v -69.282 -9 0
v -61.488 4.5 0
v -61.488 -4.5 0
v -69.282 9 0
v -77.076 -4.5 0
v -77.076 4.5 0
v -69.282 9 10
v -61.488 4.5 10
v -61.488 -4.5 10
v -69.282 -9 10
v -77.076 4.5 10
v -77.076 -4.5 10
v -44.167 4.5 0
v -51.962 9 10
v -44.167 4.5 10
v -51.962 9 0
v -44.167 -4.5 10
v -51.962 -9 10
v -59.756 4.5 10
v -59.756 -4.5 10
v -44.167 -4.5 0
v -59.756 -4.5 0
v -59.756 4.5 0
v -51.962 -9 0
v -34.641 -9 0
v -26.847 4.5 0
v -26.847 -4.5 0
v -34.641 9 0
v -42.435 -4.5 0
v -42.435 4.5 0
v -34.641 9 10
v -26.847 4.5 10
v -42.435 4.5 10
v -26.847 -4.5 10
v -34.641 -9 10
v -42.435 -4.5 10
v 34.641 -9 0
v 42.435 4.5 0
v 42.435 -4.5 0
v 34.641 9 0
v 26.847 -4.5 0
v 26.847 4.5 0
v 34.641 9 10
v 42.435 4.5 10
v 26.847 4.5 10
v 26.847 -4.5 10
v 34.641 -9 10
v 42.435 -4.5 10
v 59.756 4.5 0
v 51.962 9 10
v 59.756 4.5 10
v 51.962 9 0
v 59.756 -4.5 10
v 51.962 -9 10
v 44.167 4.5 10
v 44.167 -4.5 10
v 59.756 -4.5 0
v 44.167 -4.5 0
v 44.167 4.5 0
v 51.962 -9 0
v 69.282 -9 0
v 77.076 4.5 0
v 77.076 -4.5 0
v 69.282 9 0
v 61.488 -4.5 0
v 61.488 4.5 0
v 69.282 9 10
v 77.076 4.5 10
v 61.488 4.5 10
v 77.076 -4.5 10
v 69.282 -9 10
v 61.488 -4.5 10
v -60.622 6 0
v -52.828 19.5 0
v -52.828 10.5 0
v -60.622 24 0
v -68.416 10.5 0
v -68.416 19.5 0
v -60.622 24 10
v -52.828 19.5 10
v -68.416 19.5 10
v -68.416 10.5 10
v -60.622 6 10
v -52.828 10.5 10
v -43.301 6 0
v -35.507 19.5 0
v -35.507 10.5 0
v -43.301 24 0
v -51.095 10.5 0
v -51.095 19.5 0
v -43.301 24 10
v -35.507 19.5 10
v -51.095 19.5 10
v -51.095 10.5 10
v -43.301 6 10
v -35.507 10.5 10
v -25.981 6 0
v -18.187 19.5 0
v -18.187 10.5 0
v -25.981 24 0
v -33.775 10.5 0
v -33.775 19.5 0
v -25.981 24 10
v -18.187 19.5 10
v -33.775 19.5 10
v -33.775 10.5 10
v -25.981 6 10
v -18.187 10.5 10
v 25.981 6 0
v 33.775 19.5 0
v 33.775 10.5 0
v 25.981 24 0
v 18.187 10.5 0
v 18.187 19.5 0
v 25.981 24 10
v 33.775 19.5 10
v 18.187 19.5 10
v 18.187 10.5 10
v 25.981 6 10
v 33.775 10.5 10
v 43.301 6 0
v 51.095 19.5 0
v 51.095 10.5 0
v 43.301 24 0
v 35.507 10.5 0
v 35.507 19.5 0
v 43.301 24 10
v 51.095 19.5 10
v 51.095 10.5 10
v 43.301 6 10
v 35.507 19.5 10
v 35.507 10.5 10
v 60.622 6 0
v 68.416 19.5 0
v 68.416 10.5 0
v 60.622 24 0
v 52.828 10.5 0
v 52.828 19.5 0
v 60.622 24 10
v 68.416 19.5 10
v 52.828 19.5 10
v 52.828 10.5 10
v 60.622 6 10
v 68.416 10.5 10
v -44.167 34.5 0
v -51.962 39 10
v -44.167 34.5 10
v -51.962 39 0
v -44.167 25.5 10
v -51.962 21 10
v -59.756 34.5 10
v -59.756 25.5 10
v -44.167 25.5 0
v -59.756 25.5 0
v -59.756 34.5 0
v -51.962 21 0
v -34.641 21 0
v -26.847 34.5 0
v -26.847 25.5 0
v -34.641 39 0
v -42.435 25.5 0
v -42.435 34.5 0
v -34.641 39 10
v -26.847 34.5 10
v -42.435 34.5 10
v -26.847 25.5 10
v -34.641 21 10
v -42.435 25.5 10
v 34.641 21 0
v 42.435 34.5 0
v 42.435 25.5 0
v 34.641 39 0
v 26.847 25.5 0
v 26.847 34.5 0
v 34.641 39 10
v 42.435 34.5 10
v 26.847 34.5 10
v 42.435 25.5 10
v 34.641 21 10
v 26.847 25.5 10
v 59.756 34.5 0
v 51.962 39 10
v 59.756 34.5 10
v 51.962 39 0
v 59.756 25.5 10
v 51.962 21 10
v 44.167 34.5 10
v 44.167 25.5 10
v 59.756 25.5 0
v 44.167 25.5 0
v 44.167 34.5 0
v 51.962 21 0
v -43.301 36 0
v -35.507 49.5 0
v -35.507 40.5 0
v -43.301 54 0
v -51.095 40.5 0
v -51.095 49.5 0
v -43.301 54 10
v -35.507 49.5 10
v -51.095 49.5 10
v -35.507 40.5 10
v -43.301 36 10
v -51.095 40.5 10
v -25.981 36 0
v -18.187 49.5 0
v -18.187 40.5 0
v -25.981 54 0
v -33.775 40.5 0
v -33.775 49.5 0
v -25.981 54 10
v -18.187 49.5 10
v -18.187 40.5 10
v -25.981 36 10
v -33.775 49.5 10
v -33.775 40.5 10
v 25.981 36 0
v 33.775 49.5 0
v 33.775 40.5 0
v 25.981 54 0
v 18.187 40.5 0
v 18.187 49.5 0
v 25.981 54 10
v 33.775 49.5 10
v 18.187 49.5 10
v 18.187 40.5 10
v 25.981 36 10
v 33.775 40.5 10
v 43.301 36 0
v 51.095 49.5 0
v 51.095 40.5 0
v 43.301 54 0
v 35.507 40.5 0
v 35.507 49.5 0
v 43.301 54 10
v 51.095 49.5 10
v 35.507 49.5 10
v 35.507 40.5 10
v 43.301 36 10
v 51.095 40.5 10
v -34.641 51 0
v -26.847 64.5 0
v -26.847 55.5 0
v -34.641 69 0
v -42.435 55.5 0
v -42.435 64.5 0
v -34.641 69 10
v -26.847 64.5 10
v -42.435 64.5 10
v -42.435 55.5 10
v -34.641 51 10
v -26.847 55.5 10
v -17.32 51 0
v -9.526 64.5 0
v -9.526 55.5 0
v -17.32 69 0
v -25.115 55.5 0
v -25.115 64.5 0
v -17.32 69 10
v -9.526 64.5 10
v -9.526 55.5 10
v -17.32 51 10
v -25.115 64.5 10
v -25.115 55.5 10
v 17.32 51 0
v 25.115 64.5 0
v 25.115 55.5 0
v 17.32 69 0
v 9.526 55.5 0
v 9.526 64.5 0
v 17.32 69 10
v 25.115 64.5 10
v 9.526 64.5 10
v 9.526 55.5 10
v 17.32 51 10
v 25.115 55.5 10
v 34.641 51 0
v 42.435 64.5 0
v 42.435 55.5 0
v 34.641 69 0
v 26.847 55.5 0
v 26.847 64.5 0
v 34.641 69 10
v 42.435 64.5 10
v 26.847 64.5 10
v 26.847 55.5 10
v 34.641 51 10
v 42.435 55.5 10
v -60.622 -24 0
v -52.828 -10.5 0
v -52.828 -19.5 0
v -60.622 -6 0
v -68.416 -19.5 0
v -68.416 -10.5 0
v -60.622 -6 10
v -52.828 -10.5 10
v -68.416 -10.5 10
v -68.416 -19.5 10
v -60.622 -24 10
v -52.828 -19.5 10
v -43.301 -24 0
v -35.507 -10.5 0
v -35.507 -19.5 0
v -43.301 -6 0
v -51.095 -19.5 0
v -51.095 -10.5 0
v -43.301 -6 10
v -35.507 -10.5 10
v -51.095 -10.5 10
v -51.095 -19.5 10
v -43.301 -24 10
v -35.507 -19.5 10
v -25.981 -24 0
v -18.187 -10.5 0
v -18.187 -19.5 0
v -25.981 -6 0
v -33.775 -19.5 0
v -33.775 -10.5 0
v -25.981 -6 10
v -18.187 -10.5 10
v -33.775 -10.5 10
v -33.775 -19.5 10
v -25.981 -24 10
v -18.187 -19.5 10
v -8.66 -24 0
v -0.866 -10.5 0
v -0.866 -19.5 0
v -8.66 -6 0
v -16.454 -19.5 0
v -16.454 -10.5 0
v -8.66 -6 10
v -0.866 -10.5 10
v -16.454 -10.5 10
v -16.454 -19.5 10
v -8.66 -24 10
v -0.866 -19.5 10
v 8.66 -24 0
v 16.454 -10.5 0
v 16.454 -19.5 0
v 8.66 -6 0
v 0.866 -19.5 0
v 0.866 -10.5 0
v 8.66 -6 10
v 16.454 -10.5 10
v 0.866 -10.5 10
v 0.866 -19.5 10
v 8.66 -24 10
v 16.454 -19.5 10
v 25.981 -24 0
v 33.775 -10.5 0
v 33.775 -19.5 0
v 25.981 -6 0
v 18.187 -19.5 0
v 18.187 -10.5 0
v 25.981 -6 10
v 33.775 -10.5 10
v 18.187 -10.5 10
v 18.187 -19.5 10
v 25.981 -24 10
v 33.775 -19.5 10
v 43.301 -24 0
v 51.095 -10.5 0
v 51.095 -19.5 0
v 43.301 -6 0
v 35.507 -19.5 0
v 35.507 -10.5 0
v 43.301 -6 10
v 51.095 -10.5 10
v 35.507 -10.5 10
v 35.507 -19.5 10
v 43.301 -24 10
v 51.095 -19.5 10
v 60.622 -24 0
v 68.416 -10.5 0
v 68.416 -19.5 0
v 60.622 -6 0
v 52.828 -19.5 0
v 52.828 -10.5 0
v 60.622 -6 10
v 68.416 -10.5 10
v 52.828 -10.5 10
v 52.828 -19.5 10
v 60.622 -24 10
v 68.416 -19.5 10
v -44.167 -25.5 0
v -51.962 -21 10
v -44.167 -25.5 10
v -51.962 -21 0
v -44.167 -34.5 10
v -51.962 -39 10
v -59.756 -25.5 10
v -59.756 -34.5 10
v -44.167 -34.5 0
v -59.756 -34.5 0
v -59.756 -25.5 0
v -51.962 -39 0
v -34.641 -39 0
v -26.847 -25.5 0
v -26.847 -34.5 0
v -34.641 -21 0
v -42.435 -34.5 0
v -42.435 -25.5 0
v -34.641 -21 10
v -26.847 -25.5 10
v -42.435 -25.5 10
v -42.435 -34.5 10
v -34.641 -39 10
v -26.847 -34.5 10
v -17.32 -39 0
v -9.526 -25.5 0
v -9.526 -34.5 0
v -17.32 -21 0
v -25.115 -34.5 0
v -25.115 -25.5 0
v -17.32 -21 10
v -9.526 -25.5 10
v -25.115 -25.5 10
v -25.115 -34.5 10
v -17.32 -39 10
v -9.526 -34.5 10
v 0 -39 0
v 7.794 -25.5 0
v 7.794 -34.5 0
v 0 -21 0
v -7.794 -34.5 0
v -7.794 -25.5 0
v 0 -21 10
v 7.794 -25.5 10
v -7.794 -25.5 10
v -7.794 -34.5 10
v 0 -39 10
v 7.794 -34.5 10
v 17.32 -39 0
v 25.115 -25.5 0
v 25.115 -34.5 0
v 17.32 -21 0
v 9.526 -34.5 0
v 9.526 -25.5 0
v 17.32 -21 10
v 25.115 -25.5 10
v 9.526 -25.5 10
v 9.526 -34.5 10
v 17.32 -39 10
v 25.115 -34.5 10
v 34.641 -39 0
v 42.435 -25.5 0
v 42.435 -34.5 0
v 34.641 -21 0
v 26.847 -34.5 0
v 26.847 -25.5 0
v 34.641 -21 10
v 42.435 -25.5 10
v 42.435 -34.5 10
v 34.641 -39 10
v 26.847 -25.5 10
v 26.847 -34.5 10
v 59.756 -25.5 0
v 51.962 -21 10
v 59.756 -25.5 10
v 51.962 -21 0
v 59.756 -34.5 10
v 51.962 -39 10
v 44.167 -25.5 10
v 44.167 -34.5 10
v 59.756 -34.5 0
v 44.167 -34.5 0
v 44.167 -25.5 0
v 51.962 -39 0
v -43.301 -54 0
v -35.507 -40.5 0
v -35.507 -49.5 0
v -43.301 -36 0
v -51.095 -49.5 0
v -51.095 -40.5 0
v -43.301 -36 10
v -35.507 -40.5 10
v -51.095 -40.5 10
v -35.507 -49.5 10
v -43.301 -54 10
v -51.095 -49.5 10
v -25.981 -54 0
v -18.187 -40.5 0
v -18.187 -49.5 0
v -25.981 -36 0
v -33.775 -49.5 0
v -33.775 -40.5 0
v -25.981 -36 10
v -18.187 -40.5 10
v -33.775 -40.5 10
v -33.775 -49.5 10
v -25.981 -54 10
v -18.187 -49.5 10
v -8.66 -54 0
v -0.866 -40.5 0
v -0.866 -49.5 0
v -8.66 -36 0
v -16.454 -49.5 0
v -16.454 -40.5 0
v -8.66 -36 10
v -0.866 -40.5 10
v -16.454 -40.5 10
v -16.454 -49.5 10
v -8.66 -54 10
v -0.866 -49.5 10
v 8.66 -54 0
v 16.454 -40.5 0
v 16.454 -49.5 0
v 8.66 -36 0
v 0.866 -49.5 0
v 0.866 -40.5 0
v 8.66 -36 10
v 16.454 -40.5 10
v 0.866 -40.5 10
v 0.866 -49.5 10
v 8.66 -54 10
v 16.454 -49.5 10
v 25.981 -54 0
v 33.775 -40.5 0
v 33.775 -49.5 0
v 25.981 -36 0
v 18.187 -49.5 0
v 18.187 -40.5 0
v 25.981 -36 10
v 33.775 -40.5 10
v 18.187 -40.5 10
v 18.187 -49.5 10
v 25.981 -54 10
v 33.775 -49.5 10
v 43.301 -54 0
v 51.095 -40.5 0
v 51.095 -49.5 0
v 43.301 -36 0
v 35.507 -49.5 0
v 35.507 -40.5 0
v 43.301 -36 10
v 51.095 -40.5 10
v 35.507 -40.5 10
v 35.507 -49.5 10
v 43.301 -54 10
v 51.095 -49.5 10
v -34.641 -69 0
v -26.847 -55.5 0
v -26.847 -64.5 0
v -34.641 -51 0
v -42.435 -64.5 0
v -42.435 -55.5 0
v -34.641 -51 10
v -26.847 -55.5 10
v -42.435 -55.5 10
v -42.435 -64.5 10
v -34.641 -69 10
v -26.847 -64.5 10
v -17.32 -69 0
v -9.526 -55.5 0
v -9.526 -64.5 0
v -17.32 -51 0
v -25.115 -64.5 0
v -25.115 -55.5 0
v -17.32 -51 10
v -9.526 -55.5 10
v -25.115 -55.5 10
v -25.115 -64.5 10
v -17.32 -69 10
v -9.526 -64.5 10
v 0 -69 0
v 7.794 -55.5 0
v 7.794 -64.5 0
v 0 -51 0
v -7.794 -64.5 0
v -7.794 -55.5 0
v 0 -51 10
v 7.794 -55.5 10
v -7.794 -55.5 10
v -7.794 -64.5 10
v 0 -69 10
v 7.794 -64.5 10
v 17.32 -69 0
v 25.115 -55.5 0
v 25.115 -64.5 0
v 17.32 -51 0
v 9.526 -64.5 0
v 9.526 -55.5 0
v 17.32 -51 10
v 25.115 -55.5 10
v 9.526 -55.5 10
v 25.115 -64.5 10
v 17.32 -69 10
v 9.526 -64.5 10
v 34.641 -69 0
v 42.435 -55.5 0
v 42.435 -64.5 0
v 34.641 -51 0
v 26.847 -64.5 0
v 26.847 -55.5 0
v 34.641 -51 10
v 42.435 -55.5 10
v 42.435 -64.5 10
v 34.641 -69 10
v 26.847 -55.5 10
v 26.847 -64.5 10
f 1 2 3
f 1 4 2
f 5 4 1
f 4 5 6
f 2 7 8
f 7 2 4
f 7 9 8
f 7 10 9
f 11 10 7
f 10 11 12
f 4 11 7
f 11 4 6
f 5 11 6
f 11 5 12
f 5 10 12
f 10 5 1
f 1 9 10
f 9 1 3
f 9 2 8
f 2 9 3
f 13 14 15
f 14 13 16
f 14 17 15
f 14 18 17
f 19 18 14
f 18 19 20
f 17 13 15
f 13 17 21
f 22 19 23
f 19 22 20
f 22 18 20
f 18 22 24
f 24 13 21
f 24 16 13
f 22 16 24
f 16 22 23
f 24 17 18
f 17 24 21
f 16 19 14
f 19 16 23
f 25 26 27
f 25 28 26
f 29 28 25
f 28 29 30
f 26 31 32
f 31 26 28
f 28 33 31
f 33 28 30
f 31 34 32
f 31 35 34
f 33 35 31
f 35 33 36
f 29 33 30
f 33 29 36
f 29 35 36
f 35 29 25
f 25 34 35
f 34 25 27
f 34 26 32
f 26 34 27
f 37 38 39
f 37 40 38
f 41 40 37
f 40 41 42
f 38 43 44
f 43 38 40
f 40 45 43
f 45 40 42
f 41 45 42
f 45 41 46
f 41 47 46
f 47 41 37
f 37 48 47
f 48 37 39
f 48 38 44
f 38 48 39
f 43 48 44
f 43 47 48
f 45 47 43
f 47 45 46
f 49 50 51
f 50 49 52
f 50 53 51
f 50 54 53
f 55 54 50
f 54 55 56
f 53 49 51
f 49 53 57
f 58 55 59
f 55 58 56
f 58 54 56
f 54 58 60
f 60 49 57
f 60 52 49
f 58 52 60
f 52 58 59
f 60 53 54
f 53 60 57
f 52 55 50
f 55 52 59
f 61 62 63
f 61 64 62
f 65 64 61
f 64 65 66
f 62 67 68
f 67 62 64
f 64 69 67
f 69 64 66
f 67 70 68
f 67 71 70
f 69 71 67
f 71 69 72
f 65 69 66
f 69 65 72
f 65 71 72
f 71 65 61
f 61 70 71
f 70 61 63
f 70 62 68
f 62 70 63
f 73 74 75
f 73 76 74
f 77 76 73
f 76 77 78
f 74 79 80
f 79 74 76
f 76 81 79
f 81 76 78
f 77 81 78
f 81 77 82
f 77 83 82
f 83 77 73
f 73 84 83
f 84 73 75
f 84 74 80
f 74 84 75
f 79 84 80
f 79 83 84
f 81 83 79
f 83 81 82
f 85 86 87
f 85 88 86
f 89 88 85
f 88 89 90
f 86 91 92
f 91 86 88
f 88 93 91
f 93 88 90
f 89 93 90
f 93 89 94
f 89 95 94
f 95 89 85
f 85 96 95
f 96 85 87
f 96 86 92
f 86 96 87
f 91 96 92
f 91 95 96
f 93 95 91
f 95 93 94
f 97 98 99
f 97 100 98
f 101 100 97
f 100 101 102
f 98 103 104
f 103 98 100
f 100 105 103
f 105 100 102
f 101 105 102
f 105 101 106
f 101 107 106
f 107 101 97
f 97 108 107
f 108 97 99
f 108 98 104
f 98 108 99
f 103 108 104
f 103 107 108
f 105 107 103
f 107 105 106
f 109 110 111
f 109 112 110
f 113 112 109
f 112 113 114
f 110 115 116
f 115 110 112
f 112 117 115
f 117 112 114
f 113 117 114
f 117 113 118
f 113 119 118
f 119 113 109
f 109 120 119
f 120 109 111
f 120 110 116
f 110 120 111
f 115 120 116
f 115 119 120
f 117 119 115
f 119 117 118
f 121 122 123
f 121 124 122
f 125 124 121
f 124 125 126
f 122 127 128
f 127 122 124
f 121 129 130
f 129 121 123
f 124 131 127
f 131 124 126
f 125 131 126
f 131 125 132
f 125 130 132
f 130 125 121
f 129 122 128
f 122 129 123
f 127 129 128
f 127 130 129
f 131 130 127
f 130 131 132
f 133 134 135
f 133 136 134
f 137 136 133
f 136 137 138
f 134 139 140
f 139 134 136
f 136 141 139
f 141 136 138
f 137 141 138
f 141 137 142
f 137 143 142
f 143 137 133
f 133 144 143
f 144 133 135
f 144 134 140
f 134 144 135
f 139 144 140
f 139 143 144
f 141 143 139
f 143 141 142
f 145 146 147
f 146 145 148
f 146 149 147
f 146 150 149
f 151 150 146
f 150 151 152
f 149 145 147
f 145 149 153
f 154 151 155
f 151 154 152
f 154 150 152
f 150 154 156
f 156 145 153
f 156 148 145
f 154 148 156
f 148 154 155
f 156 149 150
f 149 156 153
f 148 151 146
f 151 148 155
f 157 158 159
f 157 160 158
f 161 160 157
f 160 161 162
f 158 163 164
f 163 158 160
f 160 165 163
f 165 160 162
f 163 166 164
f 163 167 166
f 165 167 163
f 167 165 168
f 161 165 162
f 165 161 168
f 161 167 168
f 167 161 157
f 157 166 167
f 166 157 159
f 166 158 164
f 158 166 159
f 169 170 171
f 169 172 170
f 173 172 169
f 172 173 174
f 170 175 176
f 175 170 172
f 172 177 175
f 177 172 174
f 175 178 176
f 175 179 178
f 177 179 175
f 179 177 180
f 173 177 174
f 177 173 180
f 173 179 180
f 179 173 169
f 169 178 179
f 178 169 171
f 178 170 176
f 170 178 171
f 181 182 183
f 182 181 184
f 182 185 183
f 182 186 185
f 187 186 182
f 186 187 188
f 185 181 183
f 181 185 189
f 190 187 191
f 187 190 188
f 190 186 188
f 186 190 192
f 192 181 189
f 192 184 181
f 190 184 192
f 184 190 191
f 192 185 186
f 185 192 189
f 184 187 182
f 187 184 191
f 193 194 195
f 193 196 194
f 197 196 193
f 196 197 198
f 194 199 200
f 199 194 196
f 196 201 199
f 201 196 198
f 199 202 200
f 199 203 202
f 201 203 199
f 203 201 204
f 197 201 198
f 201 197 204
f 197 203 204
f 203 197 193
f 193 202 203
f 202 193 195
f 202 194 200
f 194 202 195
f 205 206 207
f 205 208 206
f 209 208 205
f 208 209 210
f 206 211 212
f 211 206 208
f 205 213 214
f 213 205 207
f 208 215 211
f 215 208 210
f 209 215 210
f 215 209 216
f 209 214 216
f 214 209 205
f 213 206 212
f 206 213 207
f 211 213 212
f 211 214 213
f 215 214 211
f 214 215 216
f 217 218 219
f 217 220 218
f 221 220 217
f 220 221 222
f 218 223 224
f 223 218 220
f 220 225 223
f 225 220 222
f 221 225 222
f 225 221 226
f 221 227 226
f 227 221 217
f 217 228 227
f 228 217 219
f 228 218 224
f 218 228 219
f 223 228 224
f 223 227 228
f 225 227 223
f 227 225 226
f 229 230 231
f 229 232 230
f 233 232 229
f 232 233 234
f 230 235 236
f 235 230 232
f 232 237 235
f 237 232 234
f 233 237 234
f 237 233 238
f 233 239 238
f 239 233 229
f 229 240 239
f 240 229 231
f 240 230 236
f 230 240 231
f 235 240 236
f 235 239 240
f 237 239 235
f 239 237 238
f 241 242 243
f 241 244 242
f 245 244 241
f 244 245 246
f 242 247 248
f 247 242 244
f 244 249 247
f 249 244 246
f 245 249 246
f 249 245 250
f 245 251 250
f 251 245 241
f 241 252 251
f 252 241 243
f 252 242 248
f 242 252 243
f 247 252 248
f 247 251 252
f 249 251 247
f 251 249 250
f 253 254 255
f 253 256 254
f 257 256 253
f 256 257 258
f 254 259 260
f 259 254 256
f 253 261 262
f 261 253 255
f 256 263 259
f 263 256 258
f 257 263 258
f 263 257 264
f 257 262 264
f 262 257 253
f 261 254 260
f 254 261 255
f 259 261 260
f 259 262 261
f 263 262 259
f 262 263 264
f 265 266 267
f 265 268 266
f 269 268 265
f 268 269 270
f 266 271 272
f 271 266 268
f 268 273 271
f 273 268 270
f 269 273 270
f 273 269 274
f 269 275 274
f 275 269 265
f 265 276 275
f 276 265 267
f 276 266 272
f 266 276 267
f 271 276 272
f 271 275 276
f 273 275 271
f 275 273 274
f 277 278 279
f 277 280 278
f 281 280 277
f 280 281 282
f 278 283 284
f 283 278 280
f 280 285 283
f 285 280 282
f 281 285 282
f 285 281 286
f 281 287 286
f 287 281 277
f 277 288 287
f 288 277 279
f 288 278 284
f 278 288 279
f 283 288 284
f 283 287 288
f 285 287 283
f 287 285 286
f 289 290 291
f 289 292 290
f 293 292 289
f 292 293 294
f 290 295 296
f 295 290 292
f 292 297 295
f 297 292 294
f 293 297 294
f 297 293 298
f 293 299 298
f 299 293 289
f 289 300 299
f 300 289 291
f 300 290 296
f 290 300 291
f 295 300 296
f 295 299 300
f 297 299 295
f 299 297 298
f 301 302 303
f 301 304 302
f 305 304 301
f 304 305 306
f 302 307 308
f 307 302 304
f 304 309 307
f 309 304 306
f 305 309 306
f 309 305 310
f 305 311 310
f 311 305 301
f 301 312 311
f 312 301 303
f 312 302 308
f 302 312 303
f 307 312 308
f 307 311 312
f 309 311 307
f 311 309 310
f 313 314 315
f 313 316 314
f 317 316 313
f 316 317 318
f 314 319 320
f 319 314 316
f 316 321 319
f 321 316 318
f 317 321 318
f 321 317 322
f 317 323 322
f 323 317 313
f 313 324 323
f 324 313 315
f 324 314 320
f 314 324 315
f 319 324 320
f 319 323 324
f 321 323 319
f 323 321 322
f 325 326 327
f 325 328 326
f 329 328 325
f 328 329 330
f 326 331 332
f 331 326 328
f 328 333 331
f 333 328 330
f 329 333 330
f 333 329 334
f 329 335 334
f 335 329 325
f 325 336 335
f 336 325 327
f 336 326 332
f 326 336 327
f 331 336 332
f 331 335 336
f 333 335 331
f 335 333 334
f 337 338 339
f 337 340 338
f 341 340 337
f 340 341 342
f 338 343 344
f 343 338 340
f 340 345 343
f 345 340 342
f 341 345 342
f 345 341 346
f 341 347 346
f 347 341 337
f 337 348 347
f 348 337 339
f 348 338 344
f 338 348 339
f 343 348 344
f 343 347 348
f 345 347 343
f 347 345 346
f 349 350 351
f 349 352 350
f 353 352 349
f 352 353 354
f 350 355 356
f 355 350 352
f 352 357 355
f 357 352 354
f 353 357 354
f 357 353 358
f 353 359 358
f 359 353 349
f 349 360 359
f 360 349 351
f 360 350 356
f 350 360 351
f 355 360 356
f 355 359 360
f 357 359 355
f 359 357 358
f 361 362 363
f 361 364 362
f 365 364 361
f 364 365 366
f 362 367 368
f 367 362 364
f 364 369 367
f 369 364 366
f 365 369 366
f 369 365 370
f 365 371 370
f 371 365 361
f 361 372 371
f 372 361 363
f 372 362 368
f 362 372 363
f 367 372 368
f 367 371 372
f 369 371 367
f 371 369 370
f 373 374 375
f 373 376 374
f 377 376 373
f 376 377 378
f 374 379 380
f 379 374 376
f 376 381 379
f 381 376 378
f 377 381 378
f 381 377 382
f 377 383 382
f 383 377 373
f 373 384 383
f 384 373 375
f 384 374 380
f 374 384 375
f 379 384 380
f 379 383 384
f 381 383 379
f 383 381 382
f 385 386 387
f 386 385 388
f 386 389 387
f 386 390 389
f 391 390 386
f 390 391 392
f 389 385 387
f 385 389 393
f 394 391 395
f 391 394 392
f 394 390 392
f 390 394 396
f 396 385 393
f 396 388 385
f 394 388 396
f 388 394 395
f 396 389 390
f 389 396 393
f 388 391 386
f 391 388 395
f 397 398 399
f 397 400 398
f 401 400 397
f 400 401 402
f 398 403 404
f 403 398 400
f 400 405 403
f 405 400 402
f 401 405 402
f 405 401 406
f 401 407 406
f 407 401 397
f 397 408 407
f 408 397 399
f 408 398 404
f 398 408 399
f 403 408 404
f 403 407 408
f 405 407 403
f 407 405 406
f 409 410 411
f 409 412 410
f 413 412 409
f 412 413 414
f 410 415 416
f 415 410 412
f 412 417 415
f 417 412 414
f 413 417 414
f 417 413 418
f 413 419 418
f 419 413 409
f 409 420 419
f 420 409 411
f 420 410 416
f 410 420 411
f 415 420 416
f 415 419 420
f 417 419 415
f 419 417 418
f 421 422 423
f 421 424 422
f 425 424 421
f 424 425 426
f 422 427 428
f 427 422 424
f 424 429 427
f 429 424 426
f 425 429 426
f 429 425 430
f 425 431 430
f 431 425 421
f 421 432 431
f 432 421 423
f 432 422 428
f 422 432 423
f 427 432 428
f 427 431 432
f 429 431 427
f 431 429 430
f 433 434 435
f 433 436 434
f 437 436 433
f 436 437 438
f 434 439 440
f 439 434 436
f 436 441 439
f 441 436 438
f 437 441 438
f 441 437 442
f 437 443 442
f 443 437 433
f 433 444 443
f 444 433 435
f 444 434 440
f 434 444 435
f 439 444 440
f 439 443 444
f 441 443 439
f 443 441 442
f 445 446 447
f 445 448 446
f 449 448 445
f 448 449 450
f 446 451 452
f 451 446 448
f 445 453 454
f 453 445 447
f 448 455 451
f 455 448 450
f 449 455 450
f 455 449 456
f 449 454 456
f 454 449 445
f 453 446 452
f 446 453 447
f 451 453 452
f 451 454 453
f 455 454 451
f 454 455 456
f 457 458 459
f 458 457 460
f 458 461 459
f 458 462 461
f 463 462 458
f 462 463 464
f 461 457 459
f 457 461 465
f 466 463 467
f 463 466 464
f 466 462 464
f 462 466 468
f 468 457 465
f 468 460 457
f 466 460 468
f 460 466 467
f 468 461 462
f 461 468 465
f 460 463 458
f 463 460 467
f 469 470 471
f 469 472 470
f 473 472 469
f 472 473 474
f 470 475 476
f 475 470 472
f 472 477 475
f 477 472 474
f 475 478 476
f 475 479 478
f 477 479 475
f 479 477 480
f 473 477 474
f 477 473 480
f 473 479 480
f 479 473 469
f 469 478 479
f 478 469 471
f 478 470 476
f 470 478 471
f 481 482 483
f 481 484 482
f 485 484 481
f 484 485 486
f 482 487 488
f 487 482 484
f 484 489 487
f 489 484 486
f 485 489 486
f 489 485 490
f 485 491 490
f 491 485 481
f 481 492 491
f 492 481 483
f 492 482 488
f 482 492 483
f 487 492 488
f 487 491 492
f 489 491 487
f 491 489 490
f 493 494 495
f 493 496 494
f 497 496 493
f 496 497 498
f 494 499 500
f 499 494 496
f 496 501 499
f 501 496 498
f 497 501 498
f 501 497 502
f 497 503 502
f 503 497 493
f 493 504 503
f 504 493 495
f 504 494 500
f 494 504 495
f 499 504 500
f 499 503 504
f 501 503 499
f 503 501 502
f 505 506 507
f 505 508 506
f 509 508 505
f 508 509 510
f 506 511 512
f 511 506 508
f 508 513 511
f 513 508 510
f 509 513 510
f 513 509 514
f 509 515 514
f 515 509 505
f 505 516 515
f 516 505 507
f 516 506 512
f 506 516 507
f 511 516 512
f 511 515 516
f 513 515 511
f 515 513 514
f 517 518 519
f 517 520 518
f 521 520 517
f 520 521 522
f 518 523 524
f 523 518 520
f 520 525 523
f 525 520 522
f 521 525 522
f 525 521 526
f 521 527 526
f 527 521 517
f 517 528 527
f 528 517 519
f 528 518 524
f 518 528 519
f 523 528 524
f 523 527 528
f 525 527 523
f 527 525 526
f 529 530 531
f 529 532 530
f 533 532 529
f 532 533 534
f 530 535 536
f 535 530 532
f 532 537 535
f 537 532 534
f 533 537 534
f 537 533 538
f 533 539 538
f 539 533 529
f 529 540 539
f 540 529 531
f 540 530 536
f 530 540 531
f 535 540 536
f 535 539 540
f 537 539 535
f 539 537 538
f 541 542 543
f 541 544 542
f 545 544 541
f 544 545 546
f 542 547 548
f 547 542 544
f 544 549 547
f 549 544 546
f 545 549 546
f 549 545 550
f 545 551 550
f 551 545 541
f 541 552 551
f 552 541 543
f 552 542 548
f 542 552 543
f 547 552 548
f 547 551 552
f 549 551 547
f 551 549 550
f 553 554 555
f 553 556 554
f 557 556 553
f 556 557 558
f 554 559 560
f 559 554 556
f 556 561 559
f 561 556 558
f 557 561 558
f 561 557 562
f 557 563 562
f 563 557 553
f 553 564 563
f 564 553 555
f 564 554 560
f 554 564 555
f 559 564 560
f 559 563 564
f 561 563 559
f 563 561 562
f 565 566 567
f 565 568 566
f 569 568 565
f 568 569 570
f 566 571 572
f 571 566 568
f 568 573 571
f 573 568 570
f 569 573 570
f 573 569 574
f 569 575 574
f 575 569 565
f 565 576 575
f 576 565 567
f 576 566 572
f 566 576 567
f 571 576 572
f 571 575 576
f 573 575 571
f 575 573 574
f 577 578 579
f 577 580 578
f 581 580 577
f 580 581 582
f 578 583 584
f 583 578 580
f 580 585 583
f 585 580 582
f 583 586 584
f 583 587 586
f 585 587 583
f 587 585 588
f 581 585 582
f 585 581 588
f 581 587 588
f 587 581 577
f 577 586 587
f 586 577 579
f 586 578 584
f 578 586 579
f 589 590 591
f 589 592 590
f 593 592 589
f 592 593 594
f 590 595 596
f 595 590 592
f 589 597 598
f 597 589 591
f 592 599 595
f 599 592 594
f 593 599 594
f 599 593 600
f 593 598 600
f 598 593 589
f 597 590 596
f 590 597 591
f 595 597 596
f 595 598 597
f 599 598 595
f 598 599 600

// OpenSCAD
// file: ../../src/semi_regular/tess_4_8_8.scad
/*
    Tessella: Semi-Regular Tessellation - 4.8.8
    ===========================================
    This module implements the tessellation of a plane using a semi-regular tiling
    pattern defined by the vertex configuration 4.8.8, where one square and two
    octagons meet at each vertex.
*/

include <../tessUtils.scad>;

/**
 * @brief Generates center points for an octagonal grid.
 *
 * Creates a 2D grid of center points for octagons spaced by the octagon's side length.
 *
 * @param radius The radius of each octagon.
 * @param n The number of octagons along the x-axis.
 * @param m The number of octagons along the y-axis.
 * @param rotate (Optional) Boolean to apply rotation to the grid, default is true.
 * @return An array of center points for octagons.
 */
function octagons_centers_rect(
    radius,
    n,
    m
) =
    let (
        side_length = (radius * 2) / (sqrt(4 + 2 * sqrt(2))), // Side length of the octagon
        total_width = side_length * (1 + sqrt(2)) // Total width including spacing
    ) squares_centers_rect(total_width, n, m);

/**
 * @brief Generates center points for the squares in a 4.8.8 tiling grid.
 *
 * Aligns the square centers with the octagonal centers by using a shifted grid,
 * creating the required semi-regular tiling pattern.
 *
 * @param radius The radius of the octagons.
 * @param n The number of octagons along the x-axis.
 * @param m The number of octagons along the y-axis.
 * @return An array of center points for squares.
 */
function squares_8_8_centers_rect(radius, n, m) =
    let (
        side_length = (radius * 2) / (sqrt(4 + 2 * sqrt(2))), // Side length of the octagon
        total_width = side_length * (1 + sqrt(2)), // Total width including spacing
        shift_x = total_width / 2, // Horizontal shift for squares
        shift_y = total_width / 2 // Vertical shift for squares
    ) [for (c = squares_centers_rect(total_width, n - 1, m - 1)) [c[0] + shift_x, c[1] + shift_y]];

/**
 * @brief Generates vertices for octagons based on radius and center points.
 *
 * Generates the vertices for octagons based on the provided center points and radius.
 *
 * @param radius The radius of each octagon.
 * @param centers Array of center points.
 * @param angular_offset (Optional) Rotation angle for vertices, default is 22.5°.
 * @return Array of vertices for each octagon.
 */
function octagons_vertices(radius, centers, angular_offset = 22.5) =
    [
        for (center = centers) [
            for (i = [0:7]) let (
                angle = i * 45 + angular_offset
            ) [center[0] + radius * cos(angle), center[1] + radius * sin(angle)],
        ],
    ];
// file: ../../src/regular/triangles.scad
/*
    Tessella: Regular Tessellation - Triangles
    ==========================================
    This module implements the tessellation of a plane using regular triangles,
    where each tile is congruent, and all vertex angles around a point sum to 360°.

    Polygon properties:
    - Sides: 3
    - Interior Angle: 60°
    - Vertex Configuration: 3.3.3.3.3.3

    Mathematically valid because the interior angle divides 360° exactly.
    Reference: Euclidean tessellation theory for regular polygons.
*/

include <../tessUtils.scad>;

/**
 * @brief Generates center points for a "levels-based" triangle arrangement.
 *
 * Creates a roughly radial or diamond-like pattern of triangle centers. The center row
 * has (2*levels - 1) triangles, each additional row above/below decreases by 1 triangle.
 *
 * @param side   The side length of each equilateral triangle.
 * @param levels Number of levels away from the center row.
 * @return       An array of center points for triangles.
 */
function triangles_centers_radial(side, levels) =
    let (
        // Vertical height of each triangle
        vheight = side * sqrt(3) / 2,
        // Generate rows symmetrically around the center
        rows0 = [
            for (i = [-ceil(levels / 2 - 1):ceil(levels / 2 - 1)])
            let (
                rowCount = (levels - ( (levels + 1) % 2)) - abs(i), // Number of triangles in the row
                yOff = i * vheight, // Vertical offset for the row
                xStart = -(rowCount - 1) * side / 2 // Horizontal start to center the row
            ) [[xStart, yOff], rowCount],
        ],
        rows1 = (levels == 1) ? []
        : [
            for (i = [-(floor(levels / 2)):(floor(levels / 2 - 1))])
            let (
                rowCount = (levels - ( (levels) % 2)) - abs(i), // Number of triangles in the row
                yOff = i * vheight + vheight / 2 - (vheight - sqrt(3) / 3 * side) / 2, // Vertical offset for the row
                xStart = -(rowCount - 1) * side / 2 // Horizontal start to center the row
            ) [[xStart, yOff], rowCount],
        ],
        rows = concat(rows0, rows1)
    )
    // Generate center points for all rows
    [for (row = rows) for (j = [0:row[1] - 1]) [row[0][0] + j * side, row[0][1]]];

/**
 * @brief Generates center points for a rectangular grid of equilateral triangles (n x m).
 *
 * Alternating rows are horizontally offset by half a side for a typical triangular tiling pattern.
 *
 * @param side The side length of each triangle.
 * @param n    Number of triangles along x-axis.
 * @param m    Number of rows (y-axis).
 * @return     An array of center points for triangles.
 */
function triangles_centers_rect(side, n, m) =
    let (
        vheight = side * sqrt(3) / 2, // Vertical height of each triangle
        col_shift = side / 2, // Horizontal shift for each column
        row_shift = vheight, // Horizontal shift for alternating rows
        offset_shift = row_shift - (vheight - sqrt(3) / 3 * side) * 2
    ) [for (j = [0:m - 1], i = [0:n - 1]) [(i) * row_shift + (offset_shift * (j % 2)), j * col_shift]];

/**
 * @brief Generates vertices for equilateral triangles at specified centers.
 *
 * Rotates every other row by 180° and applies an additional angular offset for customization.
 *
 * @param side           The side length of each triangle.
 * @param centers        The array of center points for the triangles.
 * @param angular_offset An additional angular offset to apply to all triangles.
 * @param is_radial      If true, calculates the row index based on radial arrangement.
 * @return               A nested array of vertices for all triangles.
 */
function triangle_vertices(side, centers, angular_offset = 0, rect = true) =
    let (
        EPSILON = 1e-9, // Small value for floating-point comparison
        vheight = side * sqrt(3) / 2, // Vertical height of each triangle
        // This messy line pretty much determines if a row is odd or even based on the vertical position, it needs to check
        // using the reverse calculation of rows1 / offset shift, looking at that now it should probably be refactored.
        // Overall, this works and gets the geometrical idea across, but it's not the most readable (literally horrendous).
        row_parity = [
            for (c = centers) (
                (
                    ( ( ( (rect ? c[0] : c[1]) + EPSILON - vheight / 2 + (vheight - sqrt(3) / 3 * side) / 2) / vheight) % 1) <= EPSILON
                ) && (
                    (
                        ( ( (rect ? c[0] : c[1]) - EPSILON - vheight / 2 + (vheight - sqrt(3) / 3 * side) / 2) / vheight) % 1
                    ) >= -EPSILON
                ) ? 0
                : 1
            ),
        ], // Calculate row parity
        rotation_adjustment = [
            for (i = [0:len(centers) - 1]) (
                row_parity[i] ? (rect ? 0 : 180)
                : (rect ? 180 : 0)
            ),
        ] // Flip every other row
    ) [
            for (i = [0:len(centers) - 1]) [
                for (j = [0:2]) let (
                    angle = j * 120 + angular_offset + rotation_adjustment[i]
                ) [
                        centers[i][0] + side / sqrt(3) * cos(angle),
                        centers[i][1] + side / sqrt(3) * sin(angle),
                ],
            ],
    ];
// file: ../../src/regular/squares.scad
/*
    Tessella: Regular Tessellation - Squares
    ========================================
    This module implements the tessellation of a plane using regular squares,
    where each tile is congruent, and all vertex angles around a point sum to 360°.

    Polygon properties:
    - Sides: 4
    - Interior Angle: 90°
    - Vertex Configuration: 4.4.4.4
*/

include <../tessUtils.scad>;

/**
 * @brief Generates center points for a "levels-based" square arrangement.
 *
 * Creates a diamond-like pattern of square centers. The center (middle) row has (2*levels - 1) squares.
 * Each additional row above or below the center has one fewer square, until only 1 square remains at the
 * top and bottom (when levels > 1).
 *
 * @param side   The side length of each square.
 * @param levels Number of levels (rows above the center, plus the center, plus rows below).
 * @return       An array of center points for squares.
 */
function squares_centers_radial(side, levels) =
    let (
        // Offsets for spacing
        offset_x = side, // Horizontal spacing
        offset_y = side, // Vertical spacing

        // Generate rows from the center outward
        // Row i = -(levels-1) to +(levels-1), where i=0 is the center row.
        rows = [
            for (i = [-(levels - 1):(levels - 1)])
            let (
                rowCount = (2 * levels - 1) - abs(i), // Number of squares in the row
                yOff = i * offset_y, // Vertical position of the row
                xStart = -(rowCount - 1) * offset_x / 2 // Horizontal start to center the row
            ) [[xStart, yOff], rowCount],
        ]
    )
    // For each row definition, generate square center points
    [for (row = rows) for (j = [0:row[1] - 1]) [row[0][0] + j * offset_x, row[0][1]]];

/**
 * @brief Generates center points for a rectangular grid of squares (n x m).
 *
 * Produces a 2D grid of center points spaced by side length in both x and y directions.
 *
 * @param side The side length of each square.
 * @param n    The number of squares along the x-axis.
 * @param m    The number of squares along the y-axis.
 * @return     An array of center points for squares.
 */
function squares_centers_rect(side, n, m) =
    let (offset_x = side, offset_y = side) [for (ix = [0:n - 1], iy = [0:m - 1]) [ix * offset_x, iy * offset_y]];

/**
 * @brief Renders 2D squares at specified centers, with optional color gradient.
 *
 * @param side          The side length of each square.
 * @param spacing       (Optional) Spacing between squares, default is 0.
 * @param centers       (Optional) Array of center points. If empty, `levels` or (n,m) must be provided.
 * @param levels        (Optional) Number of levels for diamond-like pattern generation.
 * @param n, m          (Optional) Grid dimensions if using NxM generation.
 * @param color_scheme  (Optional) Name of the color scheme for gradient.
 * @param alpha         (Optional) Alpha transparency value.
 */

function squares_vertices(side, centers, angular_offset = 45) =
    [
        for (
            center = centers
        ) [
            for (i = [0:3]) let (angle = i * 90 + angular_offset) [
                    center[0] + side / sqrt(2) * cos(angle),
                    center[1] + side / sqrt(2) * sin(angle),
            ],
        ],
    ];
// file: ../../src/regular/hexagons.scad
/*
    Tessella: Regular Tessellation - Hexagons
    =========================================
    Tessellates a plane using regular hexagons.
    Properties:
    - Sides: 6
    - Interior Angle: 120°
    - Vertex Configuration: 6.6.6
*/

include <../tessUtils.scad>;

/**
 * Generates center points for a hexagonal tessellation in a radial pattern.
 * @param radius The radius of each hexagon.
 * @param levels Number of radial levels.
 * @return Array of hexagon center points.
 */
function hexagons_centers_radial(radius, levels) =
    let (
        offset_x = radius * cos(30),
        offset_y = radius + radius * sin(30),
        offset_step = 2 * offset_x,
        dx = -(levels - 1) * offset_x * 2,
        beginning_n = 2 * levels - 1,
        hexagons_pts = function(hex_datum)
        let (
            tx = hex_datum[0][0] + dx,
            ty = hex_datum[0][1],
            n_pts = hex_datum[1],
            offset_xs = [for (i = [0:n_pts - 1]) i * offset_step]
        ) [for (x = offset_xs) [x + tx, ty]],
        upper_hex_data = levels > 1 ? [
                for (i = [1:beginning_n - levels]) let (
                    x = offset_x * i,
                    y = offset_y * i,
                    n_upper = beginning_n - i
                ) [[x, y], n_upper],
            ]
        : [],
        lower_hex_data = levels > 1 ? [for (hex_datum = upper_hex_data) [[hex_datum[0][0], -hex_datum[0][1]], hex_datum[1]]]
        : [],
        total_hex_data = [[[0, 0], beginning_n], each upper_hex_data, each lower_hex_data],
        centers = [for (hex_datum = total_hex_data) hexagons_pts(hex_datum)]
    ) concat([for (c = centers) each c]);

/**
 * Generates center points for a rectangular hexagonal grid.
 * @param radius The radius of each hexagon.
 * @param n Number of hexagons along x-axis.
 * @param m Number of hexagons along y-axis.
 * @return Array of hexagon center points.
 */
function hexagons_centers_rect(radius, n, m) =
    let (
        offset_x = radius * cos(30),
        offset_y = radius + radius * sin(30),
        offset_step = 2 * offset_x
    ) [for (i = [0:n - 1], j = [0:m - 1]) [i * offset_step + (j % 2) * (offset_step / 2), j * offset_y]];

/**
 * Generates vertices for hexagons based on radius and center points.
 * @param radius The radius of each hexagon.
 * @param centers Array of center points.
 * @param angular_offset Rotation angle for vertices.
 * @return Array of vertices for each hexagon.
 */
function hexagons_vertices(radius, centers, angular_offset = 30) =
    [
        for (center = centers) [
            for (i = [0:5]) let (
                angle = i * 60 + angular_offset
            ) [center[0] + radius * cos(angle), center[1] + radius * sin(angle)],
        ],
    ];
// file: ../../src/tessUtils.scad
EPSILON = 1e-3; ///< Tolerance value used for floating-point comparisons.

/**
 * @brief Generates a gradient color based on normalized coordinates and a color scheme.
 *
 * Selects a color by mapping normalized x and y coordinates to RGB values according to the specified color scheme.
 *
 * @param normalized_x The normalized x-coordinate (0 to 1).
 * @param normalized_y The normalized y-coordinate (0 to 1).
 * @param color_scheme The name of the color scheme to use.
 * @return An RGB color array [r, g, b].
 */
function get_gradient_color(normalized_x, normalized_y, color_scheme) =
    color_scheme == "scheme1" ? [normalized_x, 1 - normalized_x, normalized_y]
    : // Red to Blue
    color_scheme == "scheme2" ? [1 - normalized_y, normalized_x, normalized_y]
    : // Green to Magenta
    color_scheme == "scheme3" ? [normalized_y, 1 - normalized_y, normalized_x]
    : // Blue to Yellow
    color_scheme == "scheme4" ? [1 - normalized_x, normalized_x, 1 - normalized_y]
    : // Cyan to Red
    color_scheme == "scheme5" ? [normalized_x, normalized_x * normalized_y, 1 - normalized_x]
    : // Purple to Green
    color_scheme == "scheme6" ? [1 - normalized_x * normalized_y, normalized_y, normalized_x]
    : // Orange to Blue
    [0.9, 0.9, 0.9]; // Default color (grey) if no valid color scheme is provided

/**
 * @brief Renders points as text labels and optional spheres in the 3D space.
 *
 * Displays each point's coordinates as text at its location and optionally places a sphere at the point.
 *
 * @param points An array of points to display, each as [x, y].
 * @param text_size (Optional) Size of the text labels; default is 1.
 * @param color (Optional) Color of the text labels; default is [0.1, 0.1, 0.1].
 * @param pointD (Optional) Diameter of the sphere to place at each point; if undef, no sphere is placed.
 * @param point_color (Optional) Color of the spheres; default is [0.1, 0.1, 0.1].
 * @param fn (Optional) Number of facets for the spheres; default is 8.
 */
module print_points(
    points,
    text_size = 1,
    color = [0.1, 0.1, 0.1],
    pointD = undef,
    point_color = [0.1, 0.1, 0.1],
    fn = 8
) {
    for (point = points) {
        // Translate +1 in Z-axis to avoid z-fighting with the surface
        translate([point[0], point[1] + pointD * 2, pointD * 2]) color(color)
                text(str("[", point[0], ", ", point[1], "]"), size=text_size, valign="center", halign="center");
        if (pointD != undef) {
            // Place a sphere at the point if pointD is specified
            color(point_color) translate([point[0], point[1], 0]) sphere(pointD, $fn=fn);
        }
    }
}

/**
 * @brief Checks if two points are equal within a specified tolerance.
 *
 * @param p1 First point as [x, y].
 * @param p2 Second point as [x, y].
 * @param tolerance (Optional) Tolerance value for comparison; default is EPSILON.
 * @return True if points are equal within tolerance, false otherwise.
 */
function points_equal(p1, p2, tolerance = EPSILON) =
    let (
        comparisons = [
            for (i = [0:len(p1) - 1]) abs(p1[i] - p2[i]) < tolerance,
        ]
    )
    // Check if all comparisons are true
    len([for (comp = comparisons) if (comp) true]) == len(comparisons);

/**
 * @brief Checks if a point exists within a list of points, within a specified tolerance.
 *
 * @param point The point to check, as [x, y].
 * @param list The list of points to search within.
 * @param tolerance (Optional) Tolerance value for comparison; default is EPSILON.
 * @return True if the point exists in the list within tolerance, false otherwise.
 */
function is_point_in_list(
    point,
    list,
    tolerance = EPSILON
) =
    let (equal_points = [for (p = list) points_equal(p, point, tolerance)]) len([for (eq = equal_points) if (eq) true]) > 0;

/**
 * @brief Filters out centers that are present in a filter list.
 *
 * Removes centers from the provided list that match any in the filter_list, within a specified tolerance.
 *
 * @param centers An array of centers to be filtered.
 * @param filter_list An array of centers to filter out.
 * @param tolerance (Optional) Tolerance value for comparison; default is EPSILON.
 * @return A filtered array of centers.
 */
function filter_center_points(centers, filter_list, tolerance = EPSILON) =
    [for (center = centers) if (!is_point_in_list(center, filter_list, tolerance)) center];

/** 
 * @brief Renders a generic polygon shape with optional extrusion and color gradient.
 *
 * This module allows rendering of polygons defined by vertices and paths, with optional extrusion for 3D effects.
 * It supports color gradients based on center points and a specified color scheme.
 *
 * @param vertices An array of vertices for the polygon.    
 * @param paths An array of paths defining the polygon.
 * @param centers (Optional) An array of center points for each polygon, used for color gradient.
 * @param color_scheme (Optional) A string defining the color scheme for the gradient.
 * @param alpha (Optional) Transparency level for the color; default is 1 (opaque).
 * @param extrude (Optional) Height for linear extrusion; if undef, no extrusion is applied.
 * @return Renders the polygon with the specified properties.
 */

module generic_poly(vertices, paths, centers = undef, color_scheme = undef, alpha = 1, extrude = undef) {
    if (!is_undef(color_scheme) && !is_undef(centers)) {
        // Compute normalization bounds
        min_x = min([for (center = centers) center[0]]);
        max_x = max([for (center = centers) center[0]]);
        min_y = min([for (center = centers) center[1]]);
        max_y = max([for (center = centers) center[1]]);

        for (i = [0:len(vertices) - 1]) {
            // Normalize coordinates for color gradient
            normalized_x = (centers[i][0] - min_x) / (max_x - min_x + 1e-9);
            normalized_y = (centers[i][1] - min_y) / (max_y - min_y + 1e-9);

            // Get color value
            color_val = get_gradient_color(normalized_x, normalized_y, color_scheme);

            // Render the shape
            color(color_val, alpha=alpha) if (!is_undef(extrude))
                linear_extrude(height=extrude)
                    polygon(points=vertices[i], paths=paths);
            else
                polygon(points=vertices[i], paths=paths);
        }
    } else {
        for (i = [0:len(vertices) - 1]) {
            // Render the shape without a color gradient
            if (!is_undef(extrude))
                linear_extrude(height=extrude) polygon(points=vertices[i], paths=paths);
            else
                polygon(points=vertices[i], paths=paths);
        }
    }
}
// file: ../../tess.scad
/**
 * @file tess.scad
 * @brief Functions and modules for generating tessellation patterns and rendering shapes.
 * @author Cameron K. Brooks
 * @copyright 2024
 * @info This file serves as an index file to allow for blind importing of all tessellation modules.
 *
 */

// Import utility modules
include <src/tessUtils.scad>

// Import regular tessellation modules

include <src/regular/hexagons.scad>; // Contains hexagon tessellation functions & assets
include <src/regular/squares.scad>; // Contains square tessellation functions & assets
include <src/regular/triangles.scad>; // Contains triangle tessellation functions & assets

// Import semi-regular (Archimedean) tessellation modules
include <src/semi_regular/tess_4_8_8.scad>; // Contains 4.8.8 tessellation functions & octagon assets
// main file
// Radial hexagons
// Five levels of hexagons of radius 10, drawn at radius 9 to leave a gap.

use <../../tess.scad>

lvls = 5; // Number of 'levels' in the radial tessellation
rad = 10; // Radius of hexagons
space = 1; // Spacing between hexagons
extHeight = 10; // Extrusion height for hexagons
filter = true; // Enable or disable filtering

unfiltered_centers = hexagons_centers_radial(radius=rad, levels=lvls);
echo("Unfiltered Centers:", unfiltered_centers);

// Use the echo output to define the desired filter points
filter_points = [
    [0, 0],
    [-17.3205, 0],
    [17.3205, 0],
    [-8.66025, 15],
    [8.66025, 15],
    [-17.3205, 30],
    [17.3205, 30],
    [0, 30],
    [-8.66025, 45],
    [8.66025, 45],
    [0, 60],
];

filtered_centers = filter_center_points(unfiltered_centers, filter_points);
echo("Filtered Centers:", filtered_centers);

// Use the filtered centers if filtering is enabled
centers = filter ? filtered_centers : centers;

// Generate vertices for the hexagons
vertices =
    filter ? hexagons_vertices(radius=rad - space, centers=filtered_centers, angular_offset=30)
    : hexagons_vertices(radius=rad - space, centers=centers, angular_offset=30);

// Render the hexagons
generic_poly(
    vertices=vertices,
    paths=[[0, 1, 2, 3, 4, 5, 0]], // Hexagon paths
    centers=centers,
    color_scheme="scheme1",
    alpha=0.5,
    extrude=10
);
// Note:
// - The 'centers' parameter is used only for calculating the color scheme.
//   If no color scheme is needed, this parameter can be omitted.
// - The 'vertices' parameter is mandatory for defining the geometry of the tessellation.
// - The 'paths' parameter defines the connectivity of vertices to form each shape.
//   For example, [[0, 1, 2, 3, 4, 5, 0]] represents a hexagon connecting vertices in order.
// - If only a flat visualization of the tessellation is required, the 'extrude' parameter can be omitted.
//   For example:
//   generic_poly(vertices = vertices, paths = [[0, 1, 2, 3, 4, 5, 0]]);

// Render points for debugging and visualization of the center points and their filtering
translate([0, 0, extHeight])
    print_points(centers, text_size=3 / 2, color="Black", pointD=0.5, point_color="Red", fn=12);
